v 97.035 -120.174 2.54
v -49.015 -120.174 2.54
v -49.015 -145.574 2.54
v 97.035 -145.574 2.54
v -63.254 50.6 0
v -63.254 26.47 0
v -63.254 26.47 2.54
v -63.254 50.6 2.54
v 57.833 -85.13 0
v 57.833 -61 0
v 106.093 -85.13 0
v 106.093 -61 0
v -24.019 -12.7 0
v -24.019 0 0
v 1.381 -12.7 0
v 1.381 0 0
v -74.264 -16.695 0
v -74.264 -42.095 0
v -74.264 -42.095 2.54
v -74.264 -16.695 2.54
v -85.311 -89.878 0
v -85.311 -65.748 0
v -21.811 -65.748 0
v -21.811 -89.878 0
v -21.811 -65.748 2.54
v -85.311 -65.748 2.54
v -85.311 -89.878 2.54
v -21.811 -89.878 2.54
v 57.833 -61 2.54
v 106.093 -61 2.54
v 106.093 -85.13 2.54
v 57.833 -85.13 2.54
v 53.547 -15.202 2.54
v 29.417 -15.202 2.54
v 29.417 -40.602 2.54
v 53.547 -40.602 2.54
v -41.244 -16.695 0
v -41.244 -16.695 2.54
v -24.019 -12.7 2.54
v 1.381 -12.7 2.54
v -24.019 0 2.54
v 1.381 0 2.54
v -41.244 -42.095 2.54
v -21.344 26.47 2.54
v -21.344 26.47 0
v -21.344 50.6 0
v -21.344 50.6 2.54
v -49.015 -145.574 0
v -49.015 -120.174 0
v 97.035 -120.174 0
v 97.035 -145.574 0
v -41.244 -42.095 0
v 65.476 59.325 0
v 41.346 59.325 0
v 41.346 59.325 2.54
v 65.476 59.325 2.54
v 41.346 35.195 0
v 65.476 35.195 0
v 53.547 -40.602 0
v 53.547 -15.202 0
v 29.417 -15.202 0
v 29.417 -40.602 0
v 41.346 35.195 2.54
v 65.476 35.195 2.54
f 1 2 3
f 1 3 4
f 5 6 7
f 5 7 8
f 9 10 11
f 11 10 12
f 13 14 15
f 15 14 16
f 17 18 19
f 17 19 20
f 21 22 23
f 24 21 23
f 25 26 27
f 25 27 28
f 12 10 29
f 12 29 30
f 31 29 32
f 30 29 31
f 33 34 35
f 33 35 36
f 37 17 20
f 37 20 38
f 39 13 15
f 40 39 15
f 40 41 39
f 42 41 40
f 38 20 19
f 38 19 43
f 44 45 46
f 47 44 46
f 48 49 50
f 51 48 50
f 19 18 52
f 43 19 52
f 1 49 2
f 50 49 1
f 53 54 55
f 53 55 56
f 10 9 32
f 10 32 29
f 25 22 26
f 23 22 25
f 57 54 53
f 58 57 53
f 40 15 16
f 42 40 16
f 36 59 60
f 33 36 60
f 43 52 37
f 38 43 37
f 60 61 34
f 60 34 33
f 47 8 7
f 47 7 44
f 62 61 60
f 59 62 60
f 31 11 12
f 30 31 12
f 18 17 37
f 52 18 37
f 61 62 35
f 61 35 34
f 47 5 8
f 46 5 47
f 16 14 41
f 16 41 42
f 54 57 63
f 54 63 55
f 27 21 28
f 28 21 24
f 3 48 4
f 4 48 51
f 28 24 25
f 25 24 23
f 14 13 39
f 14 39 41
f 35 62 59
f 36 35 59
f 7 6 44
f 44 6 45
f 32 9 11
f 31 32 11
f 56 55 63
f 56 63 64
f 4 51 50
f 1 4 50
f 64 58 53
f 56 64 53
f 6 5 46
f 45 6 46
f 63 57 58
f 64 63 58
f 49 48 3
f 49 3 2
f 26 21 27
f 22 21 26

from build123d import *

# Parameters (mm, degrees)
F0_W      = 25.4
F0_H      = 12.7
F1_DEPTH  = 2.54
F2_W      = 24.13
F2_H      = 24.13
F3_DEPTH  = 2.54
F4_W      = 41.91
F4_H      = 24.13
F5_DEPTH  = 2.54
F6_W      = 48.26
F6_H      = 24.13
F7_DEPTH  = 2.54
F8_W      = 63.5
F8_H      = 24.13
F9_DEPTH  = 2.54
F10_W     = 24.13
F10_H     = 25.4
F11_DEPTH = 2.54
F12_W     = 33.02
F12_H     = 25.4
F13_DEPTH = 2.54
F14_W     = 146.05
F14_H     = 25.4
F15_DEPTH = 2.54


with BuildPart() as f1:
    # F0 (on Top) → F1 (new body)
    with BuildSketch(Plane.XY):
        with Locations((-11.319451, -6.35)):
            Rectangle(F0_W, F0_H)
    extrude(amount=F1_DEPTH)


with BuildPart() as f3:
    # F2 (on Top) → F3 (new body)
    with BuildSketch(Plane.XY):
        with Locations((53.411093, 47.259617)):
            Rectangle(F2_W, F2_H)
    extrude(amount=F3_DEPTH)


with BuildPart() as f5:
    # F4 (on Top) → F5 (new body)
    with BuildSketch(Plane.XY):
        with Locations((-42.298781, 38.535358)):
            Rectangle(F4_W, F4_H)
    extrude(amount=F5_DEPTH)


with BuildPart() as f7:
    # F6 (on Top) → F7 (new body)
    with BuildSketch(Plane.XY):
        with Locations((81.962567, -73.064856)):
            Rectangle(F6_W, F6_H)
    extrude(amount=F7_DEPTH)


with BuildPart() as f9:
    # F8 (on Top) → F9 (new body)
    with BuildSketch(Plane.XY):
        with Locations((-53.561282, -77.812772)):
            Rectangle(F8_W, F8_H)
    extrude(amount=F9_DEPTH)


with BuildPart() as f11:
    # F10 (on Top) → F11 (new body)
    with BuildSketch(Plane.XY):
        with Locations((41.481894, -27.902153)):
            Rectangle(F10_W, F10_H)
    extrude(amount=F11_DEPTH)


with BuildPart() as f13:
    # F12 (on Top) → F13 (new body)
    with BuildSketch(Plane.XY):
        with Locations((-57.753773, -29.39461)):
            Rectangle(F12_W, F12_H)
    extrude(amount=F13_DEPTH)


with BuildPart() as f15:
    # F14 (on Top) → F15 (new body)
    with BuildSketch(Plane.XY):
        with Locations((24.00967, -132.874116)):
            Rectangle(F14_W, F14_H)
    extrude(amount=F15_DEPTH)


solid = Compound([f1.part, f3.part, f5.part, f7.part, f9.part, f11.part, f13.part, f15.part])
